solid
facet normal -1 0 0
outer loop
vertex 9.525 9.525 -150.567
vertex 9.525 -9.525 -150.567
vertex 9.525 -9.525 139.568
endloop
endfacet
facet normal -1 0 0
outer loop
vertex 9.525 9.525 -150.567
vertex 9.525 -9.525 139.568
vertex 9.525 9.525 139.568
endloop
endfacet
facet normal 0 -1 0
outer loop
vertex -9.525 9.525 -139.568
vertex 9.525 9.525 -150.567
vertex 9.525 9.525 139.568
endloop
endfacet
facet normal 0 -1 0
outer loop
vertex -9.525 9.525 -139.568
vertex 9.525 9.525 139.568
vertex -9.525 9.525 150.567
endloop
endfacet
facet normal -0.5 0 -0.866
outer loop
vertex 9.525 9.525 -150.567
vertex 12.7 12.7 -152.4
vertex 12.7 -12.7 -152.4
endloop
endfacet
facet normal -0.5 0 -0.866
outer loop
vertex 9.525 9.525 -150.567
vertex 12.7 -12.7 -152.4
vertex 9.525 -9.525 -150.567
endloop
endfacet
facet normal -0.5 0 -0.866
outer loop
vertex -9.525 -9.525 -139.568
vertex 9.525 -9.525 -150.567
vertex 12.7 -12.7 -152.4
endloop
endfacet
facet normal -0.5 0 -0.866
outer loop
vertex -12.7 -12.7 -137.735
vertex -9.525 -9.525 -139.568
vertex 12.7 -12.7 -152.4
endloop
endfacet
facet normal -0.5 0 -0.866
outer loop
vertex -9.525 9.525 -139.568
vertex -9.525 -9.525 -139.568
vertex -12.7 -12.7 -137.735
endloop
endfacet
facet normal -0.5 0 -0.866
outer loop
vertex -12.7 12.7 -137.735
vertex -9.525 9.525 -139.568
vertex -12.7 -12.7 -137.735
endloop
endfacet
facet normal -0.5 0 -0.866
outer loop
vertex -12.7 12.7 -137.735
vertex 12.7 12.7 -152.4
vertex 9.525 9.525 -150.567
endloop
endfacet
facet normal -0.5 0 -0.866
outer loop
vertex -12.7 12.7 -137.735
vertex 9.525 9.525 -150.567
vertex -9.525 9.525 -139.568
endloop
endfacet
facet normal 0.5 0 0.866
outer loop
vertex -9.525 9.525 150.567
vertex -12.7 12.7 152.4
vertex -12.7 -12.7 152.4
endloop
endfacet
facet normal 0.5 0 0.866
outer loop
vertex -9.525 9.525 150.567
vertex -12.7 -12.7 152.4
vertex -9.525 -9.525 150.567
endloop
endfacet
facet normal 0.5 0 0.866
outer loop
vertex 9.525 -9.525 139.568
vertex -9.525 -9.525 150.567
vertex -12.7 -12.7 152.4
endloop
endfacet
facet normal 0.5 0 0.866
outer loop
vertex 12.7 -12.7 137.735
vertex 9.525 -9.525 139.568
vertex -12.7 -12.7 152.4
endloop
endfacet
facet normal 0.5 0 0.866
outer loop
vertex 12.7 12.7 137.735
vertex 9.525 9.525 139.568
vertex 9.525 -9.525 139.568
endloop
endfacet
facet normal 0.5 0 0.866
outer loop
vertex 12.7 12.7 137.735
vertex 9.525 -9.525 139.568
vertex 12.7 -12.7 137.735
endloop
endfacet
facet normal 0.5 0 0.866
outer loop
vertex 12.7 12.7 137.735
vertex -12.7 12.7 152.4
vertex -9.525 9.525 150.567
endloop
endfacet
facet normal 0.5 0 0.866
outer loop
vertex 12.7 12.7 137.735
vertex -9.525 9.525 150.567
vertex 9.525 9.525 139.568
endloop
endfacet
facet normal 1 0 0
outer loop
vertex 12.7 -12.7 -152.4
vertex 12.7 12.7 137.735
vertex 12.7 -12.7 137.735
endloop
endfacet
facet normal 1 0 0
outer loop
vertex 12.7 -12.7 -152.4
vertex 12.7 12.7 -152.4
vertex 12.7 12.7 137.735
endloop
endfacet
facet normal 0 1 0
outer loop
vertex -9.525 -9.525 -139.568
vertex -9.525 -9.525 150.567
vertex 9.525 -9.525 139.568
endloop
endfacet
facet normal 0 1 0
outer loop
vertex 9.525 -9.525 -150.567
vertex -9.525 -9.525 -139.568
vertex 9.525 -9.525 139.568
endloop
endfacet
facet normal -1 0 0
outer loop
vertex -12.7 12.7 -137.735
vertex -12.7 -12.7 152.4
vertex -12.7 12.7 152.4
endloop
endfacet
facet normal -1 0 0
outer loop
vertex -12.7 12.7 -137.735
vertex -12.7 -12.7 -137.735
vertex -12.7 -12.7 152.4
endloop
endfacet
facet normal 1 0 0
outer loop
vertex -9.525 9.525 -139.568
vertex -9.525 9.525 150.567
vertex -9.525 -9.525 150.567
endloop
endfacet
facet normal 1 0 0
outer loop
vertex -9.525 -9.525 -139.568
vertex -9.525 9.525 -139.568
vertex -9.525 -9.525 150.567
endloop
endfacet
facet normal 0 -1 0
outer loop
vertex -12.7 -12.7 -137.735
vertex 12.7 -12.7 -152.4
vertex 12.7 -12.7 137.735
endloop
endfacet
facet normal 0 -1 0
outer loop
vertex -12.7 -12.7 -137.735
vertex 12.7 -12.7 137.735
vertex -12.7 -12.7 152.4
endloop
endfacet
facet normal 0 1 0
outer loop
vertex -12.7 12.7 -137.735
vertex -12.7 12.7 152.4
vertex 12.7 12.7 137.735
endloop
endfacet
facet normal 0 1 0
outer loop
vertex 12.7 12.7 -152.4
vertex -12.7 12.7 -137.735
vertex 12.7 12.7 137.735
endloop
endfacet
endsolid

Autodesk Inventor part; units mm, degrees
ref_plane "YZ Plane" through (0, 0, 0) normal (1, 0, 0) x (0, 1, 0)
ref_plane "XZ Plane" through (0, 0, 0) normal (0, 1, 0) x (-1, 0, 0)
ref_plane "XY Plane" through (0, 0, 0) normal (0, 0, 1) x (1, 0, 0)
sketch "Sketch1" plane through (0, 0, 0) normal (0, 0, 1) x (1, 0, 0)
  line L0 (-17.78, 0) -> (17.78, 0) projected
  line L1 (0, -17.78) -> (0, 17.78) projected
  line L2 (-12.7, 12.7) -> (12.7, 12.7)
  line L3 (12.7, 12.7) -> (12.7, -12.7)
  line L4 (12.7, -12.7) -> (-12.7, -12.7)
  line L5 (-12.7, -12.7) -> (-12.7, 12.7)
  line L6 (9.525, 9.525) -> (-9.525, 9.525)
  line L7 (-9.525, 9.525) -> (-9.525, -9.525)
  line L8 (-9.525, -9.525) -> (9.525, -9.525)
  line L9 (9.525, -9.525) -> (9.525, 9.525)
  point P0 (0, 0)
  point P1 (-12.7, 0)
  point P2 (0, 12.7)
  dimension "d0" = 25.4
  dimension "d1" = 3.175
extrude "Extrusion1" add sketch "Sketch1" along normal mid plane 304.8 contours L5 L2 L1 L6 L7 L0 | L0 L7 L8 L1 L4 L5 | L1 L8 L9 L0 L3 L4 | L2 L3 L0 L9 L6 L1
sketch "Sketch3" plane through (-12.7, 12.7, 152.4) normal (0, 1, 0) x (1, 0, 0)
  line L0 (0, 0) -> (25.4, 0) projected
  line L1 (25.4, 0) -> (25.4, 304.8) projected
  line L2 (0, 0) -> (25.4, 14.6647)
  point P0 (12.7, 152.4)
  dimension "d7" = 30
extrude "Extrusion3" cut sketch "Sketch3" against normal through all
sketch "Sketch4" plane through (-12.7, 12.7, -152.4) normal (0, 1, 0) x (1, 0, 0)
  line L0 (25.4, 0) -> (0, 0) projected
  line L1 (0, 0) -> (0, -304.8) projected
  line L2 (25.4, 0) -> (0, -14.6647)
  point P0 (12.7, -152.4)
  dimension "d10" = 30
extrude "Extrusion4" cut sketch "Sketch4" against normal through all
properties part number "tubing_template_0.125" material "Aluminum-6061"
